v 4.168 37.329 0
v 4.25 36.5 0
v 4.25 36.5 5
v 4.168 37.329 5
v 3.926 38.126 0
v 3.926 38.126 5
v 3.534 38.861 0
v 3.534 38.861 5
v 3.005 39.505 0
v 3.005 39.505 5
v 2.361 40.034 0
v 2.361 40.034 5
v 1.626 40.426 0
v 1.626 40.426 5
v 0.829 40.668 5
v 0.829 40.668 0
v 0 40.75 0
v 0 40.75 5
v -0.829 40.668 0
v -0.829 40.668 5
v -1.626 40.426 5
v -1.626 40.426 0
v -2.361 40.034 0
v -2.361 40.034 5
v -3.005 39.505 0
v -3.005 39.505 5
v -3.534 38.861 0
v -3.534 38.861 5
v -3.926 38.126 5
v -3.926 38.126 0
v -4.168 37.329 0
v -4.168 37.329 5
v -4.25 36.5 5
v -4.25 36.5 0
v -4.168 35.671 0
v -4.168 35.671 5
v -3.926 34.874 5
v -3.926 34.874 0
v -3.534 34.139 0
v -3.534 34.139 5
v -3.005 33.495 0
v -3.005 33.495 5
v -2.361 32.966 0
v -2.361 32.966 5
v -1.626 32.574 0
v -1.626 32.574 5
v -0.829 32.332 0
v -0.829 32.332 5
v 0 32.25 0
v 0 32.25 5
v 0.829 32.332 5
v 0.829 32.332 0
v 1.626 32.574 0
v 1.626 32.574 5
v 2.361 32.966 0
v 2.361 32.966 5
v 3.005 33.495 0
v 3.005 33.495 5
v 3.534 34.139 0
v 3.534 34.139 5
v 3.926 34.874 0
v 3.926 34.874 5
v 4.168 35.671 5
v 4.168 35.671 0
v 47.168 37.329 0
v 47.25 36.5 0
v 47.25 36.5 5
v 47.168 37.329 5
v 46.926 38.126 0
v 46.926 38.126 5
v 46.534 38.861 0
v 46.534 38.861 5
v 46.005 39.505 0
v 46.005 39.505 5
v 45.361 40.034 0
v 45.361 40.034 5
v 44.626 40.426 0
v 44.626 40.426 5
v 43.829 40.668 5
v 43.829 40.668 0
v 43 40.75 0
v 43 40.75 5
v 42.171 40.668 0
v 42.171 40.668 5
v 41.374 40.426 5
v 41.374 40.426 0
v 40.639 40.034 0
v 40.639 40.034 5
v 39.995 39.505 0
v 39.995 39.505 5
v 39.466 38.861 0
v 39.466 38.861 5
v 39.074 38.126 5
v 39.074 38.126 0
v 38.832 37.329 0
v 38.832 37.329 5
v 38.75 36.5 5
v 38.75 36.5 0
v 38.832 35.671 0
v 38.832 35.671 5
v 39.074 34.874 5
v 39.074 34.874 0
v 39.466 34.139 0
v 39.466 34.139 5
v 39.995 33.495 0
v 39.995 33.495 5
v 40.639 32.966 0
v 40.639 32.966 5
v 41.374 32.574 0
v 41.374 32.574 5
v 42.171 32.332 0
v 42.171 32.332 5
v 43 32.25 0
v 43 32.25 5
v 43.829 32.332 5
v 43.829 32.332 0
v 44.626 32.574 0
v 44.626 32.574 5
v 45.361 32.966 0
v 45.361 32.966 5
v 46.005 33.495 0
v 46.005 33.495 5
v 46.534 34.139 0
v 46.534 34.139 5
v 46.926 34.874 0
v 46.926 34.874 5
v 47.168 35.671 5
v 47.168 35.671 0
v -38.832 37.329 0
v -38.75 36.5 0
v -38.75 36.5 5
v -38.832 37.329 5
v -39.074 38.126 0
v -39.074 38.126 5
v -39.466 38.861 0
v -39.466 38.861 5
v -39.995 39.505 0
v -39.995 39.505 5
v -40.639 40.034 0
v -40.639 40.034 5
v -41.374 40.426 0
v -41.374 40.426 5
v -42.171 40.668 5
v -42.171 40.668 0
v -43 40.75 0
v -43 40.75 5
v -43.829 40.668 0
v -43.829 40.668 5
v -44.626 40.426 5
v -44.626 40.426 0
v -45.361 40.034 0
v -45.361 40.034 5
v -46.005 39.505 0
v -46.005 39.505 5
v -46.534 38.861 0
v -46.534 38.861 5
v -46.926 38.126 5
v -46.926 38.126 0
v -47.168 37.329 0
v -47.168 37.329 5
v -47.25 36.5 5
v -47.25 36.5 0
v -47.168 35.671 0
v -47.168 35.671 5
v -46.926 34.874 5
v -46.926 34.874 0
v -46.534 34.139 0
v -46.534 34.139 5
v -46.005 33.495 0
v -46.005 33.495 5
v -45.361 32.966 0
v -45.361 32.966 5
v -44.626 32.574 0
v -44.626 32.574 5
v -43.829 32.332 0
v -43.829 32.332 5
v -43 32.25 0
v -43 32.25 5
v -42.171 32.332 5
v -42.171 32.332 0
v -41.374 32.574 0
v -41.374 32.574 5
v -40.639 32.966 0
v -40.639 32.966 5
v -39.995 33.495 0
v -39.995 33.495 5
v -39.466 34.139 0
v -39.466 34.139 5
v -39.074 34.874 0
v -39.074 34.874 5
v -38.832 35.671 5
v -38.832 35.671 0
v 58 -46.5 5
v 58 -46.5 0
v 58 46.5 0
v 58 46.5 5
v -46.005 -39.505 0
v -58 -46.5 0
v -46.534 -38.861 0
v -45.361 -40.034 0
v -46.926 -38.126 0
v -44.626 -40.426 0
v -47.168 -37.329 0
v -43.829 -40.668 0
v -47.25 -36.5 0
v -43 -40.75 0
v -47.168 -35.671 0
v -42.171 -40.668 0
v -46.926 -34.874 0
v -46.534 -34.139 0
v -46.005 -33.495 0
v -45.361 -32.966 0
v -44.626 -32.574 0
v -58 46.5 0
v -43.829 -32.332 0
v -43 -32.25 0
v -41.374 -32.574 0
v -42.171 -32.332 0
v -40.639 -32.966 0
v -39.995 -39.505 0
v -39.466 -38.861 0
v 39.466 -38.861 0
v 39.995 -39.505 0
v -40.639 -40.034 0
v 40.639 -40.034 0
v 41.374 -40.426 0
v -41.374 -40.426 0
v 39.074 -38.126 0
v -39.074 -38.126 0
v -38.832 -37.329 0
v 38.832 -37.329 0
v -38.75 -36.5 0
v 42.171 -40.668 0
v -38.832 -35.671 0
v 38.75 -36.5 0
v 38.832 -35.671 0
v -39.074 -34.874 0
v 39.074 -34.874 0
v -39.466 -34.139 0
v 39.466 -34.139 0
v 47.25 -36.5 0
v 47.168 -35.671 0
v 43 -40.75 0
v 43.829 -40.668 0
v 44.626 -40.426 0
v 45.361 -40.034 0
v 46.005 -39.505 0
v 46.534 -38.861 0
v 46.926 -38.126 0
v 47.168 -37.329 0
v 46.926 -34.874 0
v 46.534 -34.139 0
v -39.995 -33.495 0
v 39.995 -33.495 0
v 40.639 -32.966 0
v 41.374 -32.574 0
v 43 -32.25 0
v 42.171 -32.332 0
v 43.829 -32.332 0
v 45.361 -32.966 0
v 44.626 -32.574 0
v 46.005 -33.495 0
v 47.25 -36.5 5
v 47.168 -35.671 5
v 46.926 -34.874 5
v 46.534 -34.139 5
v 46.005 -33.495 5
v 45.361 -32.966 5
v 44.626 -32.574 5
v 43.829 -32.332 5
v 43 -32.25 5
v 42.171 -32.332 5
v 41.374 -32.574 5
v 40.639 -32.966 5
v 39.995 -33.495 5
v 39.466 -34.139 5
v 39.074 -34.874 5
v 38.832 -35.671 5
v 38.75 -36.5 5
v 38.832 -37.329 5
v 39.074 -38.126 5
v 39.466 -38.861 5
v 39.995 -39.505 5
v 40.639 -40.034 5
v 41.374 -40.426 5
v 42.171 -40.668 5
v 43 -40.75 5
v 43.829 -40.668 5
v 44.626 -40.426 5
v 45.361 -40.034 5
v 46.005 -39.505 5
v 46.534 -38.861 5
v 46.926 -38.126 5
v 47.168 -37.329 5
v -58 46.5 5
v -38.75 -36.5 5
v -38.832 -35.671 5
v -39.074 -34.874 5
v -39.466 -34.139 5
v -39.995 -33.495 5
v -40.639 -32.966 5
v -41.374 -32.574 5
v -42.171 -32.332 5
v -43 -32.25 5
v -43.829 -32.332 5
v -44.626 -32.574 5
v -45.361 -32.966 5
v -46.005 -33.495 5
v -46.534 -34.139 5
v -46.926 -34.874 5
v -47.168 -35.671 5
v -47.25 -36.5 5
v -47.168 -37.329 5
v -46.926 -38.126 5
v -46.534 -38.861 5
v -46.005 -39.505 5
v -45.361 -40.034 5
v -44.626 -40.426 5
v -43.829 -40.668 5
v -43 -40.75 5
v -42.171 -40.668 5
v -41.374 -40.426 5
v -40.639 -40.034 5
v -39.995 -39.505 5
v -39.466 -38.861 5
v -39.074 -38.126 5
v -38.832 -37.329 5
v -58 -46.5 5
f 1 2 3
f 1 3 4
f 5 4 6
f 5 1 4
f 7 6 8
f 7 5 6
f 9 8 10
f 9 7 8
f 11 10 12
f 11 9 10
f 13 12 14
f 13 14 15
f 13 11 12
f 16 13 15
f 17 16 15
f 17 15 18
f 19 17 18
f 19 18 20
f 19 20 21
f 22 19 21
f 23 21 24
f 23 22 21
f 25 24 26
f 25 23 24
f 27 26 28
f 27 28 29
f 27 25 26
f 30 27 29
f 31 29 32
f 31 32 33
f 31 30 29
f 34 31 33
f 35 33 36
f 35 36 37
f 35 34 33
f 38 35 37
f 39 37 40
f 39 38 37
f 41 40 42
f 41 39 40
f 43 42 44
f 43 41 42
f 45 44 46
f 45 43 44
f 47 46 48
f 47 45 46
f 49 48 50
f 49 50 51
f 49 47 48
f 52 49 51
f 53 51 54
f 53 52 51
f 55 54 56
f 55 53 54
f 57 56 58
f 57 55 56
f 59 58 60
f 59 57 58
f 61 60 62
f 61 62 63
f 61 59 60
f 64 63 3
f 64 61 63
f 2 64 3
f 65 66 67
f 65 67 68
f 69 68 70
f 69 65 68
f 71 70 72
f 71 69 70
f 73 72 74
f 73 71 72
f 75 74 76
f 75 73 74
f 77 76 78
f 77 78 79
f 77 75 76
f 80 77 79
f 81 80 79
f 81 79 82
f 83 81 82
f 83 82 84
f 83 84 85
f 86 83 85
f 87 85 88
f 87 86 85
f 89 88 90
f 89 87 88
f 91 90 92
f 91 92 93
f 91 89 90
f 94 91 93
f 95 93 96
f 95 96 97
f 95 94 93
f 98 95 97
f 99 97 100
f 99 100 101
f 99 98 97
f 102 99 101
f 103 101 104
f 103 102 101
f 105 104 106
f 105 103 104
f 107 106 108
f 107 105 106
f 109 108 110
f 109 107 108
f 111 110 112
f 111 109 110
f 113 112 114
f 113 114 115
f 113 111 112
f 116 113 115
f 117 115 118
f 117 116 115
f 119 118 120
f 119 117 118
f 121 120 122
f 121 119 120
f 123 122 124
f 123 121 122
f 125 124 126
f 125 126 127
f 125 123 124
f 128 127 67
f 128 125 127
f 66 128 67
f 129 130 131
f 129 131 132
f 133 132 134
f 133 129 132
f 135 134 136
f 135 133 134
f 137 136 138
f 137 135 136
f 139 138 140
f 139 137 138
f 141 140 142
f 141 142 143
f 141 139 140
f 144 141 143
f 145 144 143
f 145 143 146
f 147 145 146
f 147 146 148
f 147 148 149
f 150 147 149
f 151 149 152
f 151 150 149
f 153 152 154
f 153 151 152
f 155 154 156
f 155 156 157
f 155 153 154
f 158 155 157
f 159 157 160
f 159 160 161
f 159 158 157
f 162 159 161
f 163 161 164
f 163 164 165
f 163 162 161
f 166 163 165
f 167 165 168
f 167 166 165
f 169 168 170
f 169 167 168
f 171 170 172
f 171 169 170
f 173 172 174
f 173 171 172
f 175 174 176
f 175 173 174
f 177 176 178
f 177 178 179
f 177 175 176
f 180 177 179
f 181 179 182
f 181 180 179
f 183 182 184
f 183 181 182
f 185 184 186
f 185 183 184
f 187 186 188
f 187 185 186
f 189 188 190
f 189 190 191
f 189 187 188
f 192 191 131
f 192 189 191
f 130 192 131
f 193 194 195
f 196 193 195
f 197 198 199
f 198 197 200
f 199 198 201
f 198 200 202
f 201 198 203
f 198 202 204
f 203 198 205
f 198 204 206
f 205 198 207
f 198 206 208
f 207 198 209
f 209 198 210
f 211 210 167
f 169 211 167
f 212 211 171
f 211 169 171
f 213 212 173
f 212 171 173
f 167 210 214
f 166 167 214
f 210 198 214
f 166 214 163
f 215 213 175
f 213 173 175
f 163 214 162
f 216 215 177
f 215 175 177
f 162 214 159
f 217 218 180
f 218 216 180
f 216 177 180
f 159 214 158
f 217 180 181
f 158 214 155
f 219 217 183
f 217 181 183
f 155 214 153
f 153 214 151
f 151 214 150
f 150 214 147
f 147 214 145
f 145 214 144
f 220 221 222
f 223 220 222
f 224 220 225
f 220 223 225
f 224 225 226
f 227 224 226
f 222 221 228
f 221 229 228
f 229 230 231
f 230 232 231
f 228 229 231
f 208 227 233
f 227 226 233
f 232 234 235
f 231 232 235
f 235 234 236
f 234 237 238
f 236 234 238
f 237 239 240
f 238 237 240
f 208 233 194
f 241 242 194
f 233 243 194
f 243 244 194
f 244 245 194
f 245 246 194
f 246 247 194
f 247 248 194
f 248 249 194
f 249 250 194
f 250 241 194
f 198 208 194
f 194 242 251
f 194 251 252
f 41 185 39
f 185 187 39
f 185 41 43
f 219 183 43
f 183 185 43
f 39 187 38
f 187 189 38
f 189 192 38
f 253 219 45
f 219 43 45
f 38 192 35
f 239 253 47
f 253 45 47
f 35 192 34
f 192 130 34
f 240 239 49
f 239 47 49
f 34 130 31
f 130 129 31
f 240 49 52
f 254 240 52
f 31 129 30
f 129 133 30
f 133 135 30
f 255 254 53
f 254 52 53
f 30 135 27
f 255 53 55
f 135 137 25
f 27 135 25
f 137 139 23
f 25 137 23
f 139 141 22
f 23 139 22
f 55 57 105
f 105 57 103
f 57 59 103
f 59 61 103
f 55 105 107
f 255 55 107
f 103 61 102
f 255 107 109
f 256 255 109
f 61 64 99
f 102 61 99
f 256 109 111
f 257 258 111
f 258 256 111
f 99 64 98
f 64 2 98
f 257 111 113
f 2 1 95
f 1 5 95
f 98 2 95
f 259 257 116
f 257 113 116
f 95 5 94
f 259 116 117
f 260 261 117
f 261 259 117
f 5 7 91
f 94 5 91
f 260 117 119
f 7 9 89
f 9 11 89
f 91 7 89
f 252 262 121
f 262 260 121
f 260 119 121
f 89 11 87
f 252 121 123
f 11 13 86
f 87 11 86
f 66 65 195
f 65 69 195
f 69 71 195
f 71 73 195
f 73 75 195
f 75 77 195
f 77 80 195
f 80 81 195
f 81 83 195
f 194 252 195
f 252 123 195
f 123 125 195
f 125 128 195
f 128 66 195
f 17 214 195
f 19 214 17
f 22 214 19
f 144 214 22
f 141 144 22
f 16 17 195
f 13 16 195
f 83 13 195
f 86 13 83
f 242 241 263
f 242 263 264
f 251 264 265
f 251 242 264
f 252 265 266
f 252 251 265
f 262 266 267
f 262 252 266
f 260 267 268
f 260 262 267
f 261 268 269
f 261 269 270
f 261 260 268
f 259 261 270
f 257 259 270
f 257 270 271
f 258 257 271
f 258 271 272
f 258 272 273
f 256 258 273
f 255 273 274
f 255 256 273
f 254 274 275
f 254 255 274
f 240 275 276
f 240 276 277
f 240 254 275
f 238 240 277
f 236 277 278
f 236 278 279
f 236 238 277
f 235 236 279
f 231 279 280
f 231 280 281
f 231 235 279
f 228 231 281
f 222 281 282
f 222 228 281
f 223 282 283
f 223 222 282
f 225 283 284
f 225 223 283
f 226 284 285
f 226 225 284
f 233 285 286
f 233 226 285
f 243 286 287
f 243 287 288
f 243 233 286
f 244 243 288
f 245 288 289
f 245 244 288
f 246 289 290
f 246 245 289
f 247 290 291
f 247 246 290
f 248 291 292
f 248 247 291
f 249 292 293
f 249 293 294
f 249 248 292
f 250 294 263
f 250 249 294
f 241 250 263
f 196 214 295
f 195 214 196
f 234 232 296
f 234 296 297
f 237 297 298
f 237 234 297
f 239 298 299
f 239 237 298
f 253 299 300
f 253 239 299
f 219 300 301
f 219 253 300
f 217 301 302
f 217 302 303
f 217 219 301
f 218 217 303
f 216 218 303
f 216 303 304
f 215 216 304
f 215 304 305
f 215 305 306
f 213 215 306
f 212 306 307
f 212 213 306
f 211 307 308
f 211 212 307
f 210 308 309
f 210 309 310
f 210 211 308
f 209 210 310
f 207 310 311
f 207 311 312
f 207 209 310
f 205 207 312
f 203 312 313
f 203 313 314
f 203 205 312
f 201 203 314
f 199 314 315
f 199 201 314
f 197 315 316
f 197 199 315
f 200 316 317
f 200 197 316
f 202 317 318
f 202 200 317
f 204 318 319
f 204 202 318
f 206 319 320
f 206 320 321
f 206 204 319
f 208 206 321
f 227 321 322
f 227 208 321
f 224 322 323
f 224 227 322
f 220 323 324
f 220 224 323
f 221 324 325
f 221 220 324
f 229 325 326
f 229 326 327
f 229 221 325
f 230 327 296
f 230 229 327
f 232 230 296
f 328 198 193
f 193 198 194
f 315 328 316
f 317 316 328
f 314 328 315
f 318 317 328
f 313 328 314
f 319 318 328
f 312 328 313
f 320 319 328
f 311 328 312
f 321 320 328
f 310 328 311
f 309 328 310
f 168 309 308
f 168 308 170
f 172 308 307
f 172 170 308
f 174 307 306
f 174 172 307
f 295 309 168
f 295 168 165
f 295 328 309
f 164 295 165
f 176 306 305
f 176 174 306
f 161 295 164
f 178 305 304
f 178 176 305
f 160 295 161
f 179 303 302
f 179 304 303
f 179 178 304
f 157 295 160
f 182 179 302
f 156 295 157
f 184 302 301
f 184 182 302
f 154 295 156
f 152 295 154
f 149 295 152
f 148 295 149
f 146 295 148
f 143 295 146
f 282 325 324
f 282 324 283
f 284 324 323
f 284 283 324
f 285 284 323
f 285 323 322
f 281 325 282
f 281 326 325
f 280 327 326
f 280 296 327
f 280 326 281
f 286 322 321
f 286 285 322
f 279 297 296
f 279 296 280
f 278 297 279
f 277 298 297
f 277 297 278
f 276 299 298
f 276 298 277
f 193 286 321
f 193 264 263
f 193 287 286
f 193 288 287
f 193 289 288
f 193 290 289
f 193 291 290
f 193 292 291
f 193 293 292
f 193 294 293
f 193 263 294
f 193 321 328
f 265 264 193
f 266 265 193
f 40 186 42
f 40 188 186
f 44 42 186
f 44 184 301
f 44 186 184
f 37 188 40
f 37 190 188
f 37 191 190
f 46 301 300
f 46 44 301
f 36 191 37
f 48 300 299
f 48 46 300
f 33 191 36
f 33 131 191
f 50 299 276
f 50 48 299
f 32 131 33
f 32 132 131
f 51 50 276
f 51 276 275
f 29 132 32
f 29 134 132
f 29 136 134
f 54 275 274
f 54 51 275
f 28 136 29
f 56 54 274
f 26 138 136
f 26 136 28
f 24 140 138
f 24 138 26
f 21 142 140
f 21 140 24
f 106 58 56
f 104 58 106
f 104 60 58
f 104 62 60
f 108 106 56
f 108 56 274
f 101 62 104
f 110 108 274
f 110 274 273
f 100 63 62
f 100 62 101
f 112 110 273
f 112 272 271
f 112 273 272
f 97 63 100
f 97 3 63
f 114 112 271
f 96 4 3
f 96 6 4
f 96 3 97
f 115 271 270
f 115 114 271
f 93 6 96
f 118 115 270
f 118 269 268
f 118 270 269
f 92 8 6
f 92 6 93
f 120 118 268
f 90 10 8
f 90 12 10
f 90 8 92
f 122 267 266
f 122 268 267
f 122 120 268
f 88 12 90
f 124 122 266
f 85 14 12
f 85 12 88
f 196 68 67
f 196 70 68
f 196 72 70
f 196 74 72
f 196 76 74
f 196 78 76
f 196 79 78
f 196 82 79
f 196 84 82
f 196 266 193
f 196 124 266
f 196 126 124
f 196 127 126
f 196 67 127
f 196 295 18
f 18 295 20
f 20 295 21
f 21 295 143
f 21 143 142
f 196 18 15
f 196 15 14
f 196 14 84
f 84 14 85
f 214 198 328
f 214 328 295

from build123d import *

# Parameters (mm, degrees)
SKETCH1_W           = 116
SKETCH1_H           = 93
SKETCH1_R           = 4.25
BOSS_EXTRUDE1_DEPTH = 5


with BuildPart() as part:
    # Sketch1 → Boss-Extrude1 (new body)
    with BuildSketch(Plane.XY):
        Rectangle(SKETCH1_W, SKETCH1_H)
        with Locations((-43, 36.5)):
            Circle(SKETCH1_R, mode=Mode.SUBTRACT)
        with Locations((43, 36.5)):
            Circle(SKETCH1_R, mode=Mode.SUBTRACT)
        with Locations((43, -36.5)):
            Circle(SKETCH1_R, mode=Mode.SUBTRACT)
        with Locations((-43, -36.5)):
            Circle(SKETCH1_R, mode=Mode.SUBTRACT)
        with Locations((0, 36.5)):
            Circle(SKETCH1_R, mode=Mode.SUBTRACT)
    extrude(amount=BOSS_EXTRUDE1_DEPTH)


solid = part.part
